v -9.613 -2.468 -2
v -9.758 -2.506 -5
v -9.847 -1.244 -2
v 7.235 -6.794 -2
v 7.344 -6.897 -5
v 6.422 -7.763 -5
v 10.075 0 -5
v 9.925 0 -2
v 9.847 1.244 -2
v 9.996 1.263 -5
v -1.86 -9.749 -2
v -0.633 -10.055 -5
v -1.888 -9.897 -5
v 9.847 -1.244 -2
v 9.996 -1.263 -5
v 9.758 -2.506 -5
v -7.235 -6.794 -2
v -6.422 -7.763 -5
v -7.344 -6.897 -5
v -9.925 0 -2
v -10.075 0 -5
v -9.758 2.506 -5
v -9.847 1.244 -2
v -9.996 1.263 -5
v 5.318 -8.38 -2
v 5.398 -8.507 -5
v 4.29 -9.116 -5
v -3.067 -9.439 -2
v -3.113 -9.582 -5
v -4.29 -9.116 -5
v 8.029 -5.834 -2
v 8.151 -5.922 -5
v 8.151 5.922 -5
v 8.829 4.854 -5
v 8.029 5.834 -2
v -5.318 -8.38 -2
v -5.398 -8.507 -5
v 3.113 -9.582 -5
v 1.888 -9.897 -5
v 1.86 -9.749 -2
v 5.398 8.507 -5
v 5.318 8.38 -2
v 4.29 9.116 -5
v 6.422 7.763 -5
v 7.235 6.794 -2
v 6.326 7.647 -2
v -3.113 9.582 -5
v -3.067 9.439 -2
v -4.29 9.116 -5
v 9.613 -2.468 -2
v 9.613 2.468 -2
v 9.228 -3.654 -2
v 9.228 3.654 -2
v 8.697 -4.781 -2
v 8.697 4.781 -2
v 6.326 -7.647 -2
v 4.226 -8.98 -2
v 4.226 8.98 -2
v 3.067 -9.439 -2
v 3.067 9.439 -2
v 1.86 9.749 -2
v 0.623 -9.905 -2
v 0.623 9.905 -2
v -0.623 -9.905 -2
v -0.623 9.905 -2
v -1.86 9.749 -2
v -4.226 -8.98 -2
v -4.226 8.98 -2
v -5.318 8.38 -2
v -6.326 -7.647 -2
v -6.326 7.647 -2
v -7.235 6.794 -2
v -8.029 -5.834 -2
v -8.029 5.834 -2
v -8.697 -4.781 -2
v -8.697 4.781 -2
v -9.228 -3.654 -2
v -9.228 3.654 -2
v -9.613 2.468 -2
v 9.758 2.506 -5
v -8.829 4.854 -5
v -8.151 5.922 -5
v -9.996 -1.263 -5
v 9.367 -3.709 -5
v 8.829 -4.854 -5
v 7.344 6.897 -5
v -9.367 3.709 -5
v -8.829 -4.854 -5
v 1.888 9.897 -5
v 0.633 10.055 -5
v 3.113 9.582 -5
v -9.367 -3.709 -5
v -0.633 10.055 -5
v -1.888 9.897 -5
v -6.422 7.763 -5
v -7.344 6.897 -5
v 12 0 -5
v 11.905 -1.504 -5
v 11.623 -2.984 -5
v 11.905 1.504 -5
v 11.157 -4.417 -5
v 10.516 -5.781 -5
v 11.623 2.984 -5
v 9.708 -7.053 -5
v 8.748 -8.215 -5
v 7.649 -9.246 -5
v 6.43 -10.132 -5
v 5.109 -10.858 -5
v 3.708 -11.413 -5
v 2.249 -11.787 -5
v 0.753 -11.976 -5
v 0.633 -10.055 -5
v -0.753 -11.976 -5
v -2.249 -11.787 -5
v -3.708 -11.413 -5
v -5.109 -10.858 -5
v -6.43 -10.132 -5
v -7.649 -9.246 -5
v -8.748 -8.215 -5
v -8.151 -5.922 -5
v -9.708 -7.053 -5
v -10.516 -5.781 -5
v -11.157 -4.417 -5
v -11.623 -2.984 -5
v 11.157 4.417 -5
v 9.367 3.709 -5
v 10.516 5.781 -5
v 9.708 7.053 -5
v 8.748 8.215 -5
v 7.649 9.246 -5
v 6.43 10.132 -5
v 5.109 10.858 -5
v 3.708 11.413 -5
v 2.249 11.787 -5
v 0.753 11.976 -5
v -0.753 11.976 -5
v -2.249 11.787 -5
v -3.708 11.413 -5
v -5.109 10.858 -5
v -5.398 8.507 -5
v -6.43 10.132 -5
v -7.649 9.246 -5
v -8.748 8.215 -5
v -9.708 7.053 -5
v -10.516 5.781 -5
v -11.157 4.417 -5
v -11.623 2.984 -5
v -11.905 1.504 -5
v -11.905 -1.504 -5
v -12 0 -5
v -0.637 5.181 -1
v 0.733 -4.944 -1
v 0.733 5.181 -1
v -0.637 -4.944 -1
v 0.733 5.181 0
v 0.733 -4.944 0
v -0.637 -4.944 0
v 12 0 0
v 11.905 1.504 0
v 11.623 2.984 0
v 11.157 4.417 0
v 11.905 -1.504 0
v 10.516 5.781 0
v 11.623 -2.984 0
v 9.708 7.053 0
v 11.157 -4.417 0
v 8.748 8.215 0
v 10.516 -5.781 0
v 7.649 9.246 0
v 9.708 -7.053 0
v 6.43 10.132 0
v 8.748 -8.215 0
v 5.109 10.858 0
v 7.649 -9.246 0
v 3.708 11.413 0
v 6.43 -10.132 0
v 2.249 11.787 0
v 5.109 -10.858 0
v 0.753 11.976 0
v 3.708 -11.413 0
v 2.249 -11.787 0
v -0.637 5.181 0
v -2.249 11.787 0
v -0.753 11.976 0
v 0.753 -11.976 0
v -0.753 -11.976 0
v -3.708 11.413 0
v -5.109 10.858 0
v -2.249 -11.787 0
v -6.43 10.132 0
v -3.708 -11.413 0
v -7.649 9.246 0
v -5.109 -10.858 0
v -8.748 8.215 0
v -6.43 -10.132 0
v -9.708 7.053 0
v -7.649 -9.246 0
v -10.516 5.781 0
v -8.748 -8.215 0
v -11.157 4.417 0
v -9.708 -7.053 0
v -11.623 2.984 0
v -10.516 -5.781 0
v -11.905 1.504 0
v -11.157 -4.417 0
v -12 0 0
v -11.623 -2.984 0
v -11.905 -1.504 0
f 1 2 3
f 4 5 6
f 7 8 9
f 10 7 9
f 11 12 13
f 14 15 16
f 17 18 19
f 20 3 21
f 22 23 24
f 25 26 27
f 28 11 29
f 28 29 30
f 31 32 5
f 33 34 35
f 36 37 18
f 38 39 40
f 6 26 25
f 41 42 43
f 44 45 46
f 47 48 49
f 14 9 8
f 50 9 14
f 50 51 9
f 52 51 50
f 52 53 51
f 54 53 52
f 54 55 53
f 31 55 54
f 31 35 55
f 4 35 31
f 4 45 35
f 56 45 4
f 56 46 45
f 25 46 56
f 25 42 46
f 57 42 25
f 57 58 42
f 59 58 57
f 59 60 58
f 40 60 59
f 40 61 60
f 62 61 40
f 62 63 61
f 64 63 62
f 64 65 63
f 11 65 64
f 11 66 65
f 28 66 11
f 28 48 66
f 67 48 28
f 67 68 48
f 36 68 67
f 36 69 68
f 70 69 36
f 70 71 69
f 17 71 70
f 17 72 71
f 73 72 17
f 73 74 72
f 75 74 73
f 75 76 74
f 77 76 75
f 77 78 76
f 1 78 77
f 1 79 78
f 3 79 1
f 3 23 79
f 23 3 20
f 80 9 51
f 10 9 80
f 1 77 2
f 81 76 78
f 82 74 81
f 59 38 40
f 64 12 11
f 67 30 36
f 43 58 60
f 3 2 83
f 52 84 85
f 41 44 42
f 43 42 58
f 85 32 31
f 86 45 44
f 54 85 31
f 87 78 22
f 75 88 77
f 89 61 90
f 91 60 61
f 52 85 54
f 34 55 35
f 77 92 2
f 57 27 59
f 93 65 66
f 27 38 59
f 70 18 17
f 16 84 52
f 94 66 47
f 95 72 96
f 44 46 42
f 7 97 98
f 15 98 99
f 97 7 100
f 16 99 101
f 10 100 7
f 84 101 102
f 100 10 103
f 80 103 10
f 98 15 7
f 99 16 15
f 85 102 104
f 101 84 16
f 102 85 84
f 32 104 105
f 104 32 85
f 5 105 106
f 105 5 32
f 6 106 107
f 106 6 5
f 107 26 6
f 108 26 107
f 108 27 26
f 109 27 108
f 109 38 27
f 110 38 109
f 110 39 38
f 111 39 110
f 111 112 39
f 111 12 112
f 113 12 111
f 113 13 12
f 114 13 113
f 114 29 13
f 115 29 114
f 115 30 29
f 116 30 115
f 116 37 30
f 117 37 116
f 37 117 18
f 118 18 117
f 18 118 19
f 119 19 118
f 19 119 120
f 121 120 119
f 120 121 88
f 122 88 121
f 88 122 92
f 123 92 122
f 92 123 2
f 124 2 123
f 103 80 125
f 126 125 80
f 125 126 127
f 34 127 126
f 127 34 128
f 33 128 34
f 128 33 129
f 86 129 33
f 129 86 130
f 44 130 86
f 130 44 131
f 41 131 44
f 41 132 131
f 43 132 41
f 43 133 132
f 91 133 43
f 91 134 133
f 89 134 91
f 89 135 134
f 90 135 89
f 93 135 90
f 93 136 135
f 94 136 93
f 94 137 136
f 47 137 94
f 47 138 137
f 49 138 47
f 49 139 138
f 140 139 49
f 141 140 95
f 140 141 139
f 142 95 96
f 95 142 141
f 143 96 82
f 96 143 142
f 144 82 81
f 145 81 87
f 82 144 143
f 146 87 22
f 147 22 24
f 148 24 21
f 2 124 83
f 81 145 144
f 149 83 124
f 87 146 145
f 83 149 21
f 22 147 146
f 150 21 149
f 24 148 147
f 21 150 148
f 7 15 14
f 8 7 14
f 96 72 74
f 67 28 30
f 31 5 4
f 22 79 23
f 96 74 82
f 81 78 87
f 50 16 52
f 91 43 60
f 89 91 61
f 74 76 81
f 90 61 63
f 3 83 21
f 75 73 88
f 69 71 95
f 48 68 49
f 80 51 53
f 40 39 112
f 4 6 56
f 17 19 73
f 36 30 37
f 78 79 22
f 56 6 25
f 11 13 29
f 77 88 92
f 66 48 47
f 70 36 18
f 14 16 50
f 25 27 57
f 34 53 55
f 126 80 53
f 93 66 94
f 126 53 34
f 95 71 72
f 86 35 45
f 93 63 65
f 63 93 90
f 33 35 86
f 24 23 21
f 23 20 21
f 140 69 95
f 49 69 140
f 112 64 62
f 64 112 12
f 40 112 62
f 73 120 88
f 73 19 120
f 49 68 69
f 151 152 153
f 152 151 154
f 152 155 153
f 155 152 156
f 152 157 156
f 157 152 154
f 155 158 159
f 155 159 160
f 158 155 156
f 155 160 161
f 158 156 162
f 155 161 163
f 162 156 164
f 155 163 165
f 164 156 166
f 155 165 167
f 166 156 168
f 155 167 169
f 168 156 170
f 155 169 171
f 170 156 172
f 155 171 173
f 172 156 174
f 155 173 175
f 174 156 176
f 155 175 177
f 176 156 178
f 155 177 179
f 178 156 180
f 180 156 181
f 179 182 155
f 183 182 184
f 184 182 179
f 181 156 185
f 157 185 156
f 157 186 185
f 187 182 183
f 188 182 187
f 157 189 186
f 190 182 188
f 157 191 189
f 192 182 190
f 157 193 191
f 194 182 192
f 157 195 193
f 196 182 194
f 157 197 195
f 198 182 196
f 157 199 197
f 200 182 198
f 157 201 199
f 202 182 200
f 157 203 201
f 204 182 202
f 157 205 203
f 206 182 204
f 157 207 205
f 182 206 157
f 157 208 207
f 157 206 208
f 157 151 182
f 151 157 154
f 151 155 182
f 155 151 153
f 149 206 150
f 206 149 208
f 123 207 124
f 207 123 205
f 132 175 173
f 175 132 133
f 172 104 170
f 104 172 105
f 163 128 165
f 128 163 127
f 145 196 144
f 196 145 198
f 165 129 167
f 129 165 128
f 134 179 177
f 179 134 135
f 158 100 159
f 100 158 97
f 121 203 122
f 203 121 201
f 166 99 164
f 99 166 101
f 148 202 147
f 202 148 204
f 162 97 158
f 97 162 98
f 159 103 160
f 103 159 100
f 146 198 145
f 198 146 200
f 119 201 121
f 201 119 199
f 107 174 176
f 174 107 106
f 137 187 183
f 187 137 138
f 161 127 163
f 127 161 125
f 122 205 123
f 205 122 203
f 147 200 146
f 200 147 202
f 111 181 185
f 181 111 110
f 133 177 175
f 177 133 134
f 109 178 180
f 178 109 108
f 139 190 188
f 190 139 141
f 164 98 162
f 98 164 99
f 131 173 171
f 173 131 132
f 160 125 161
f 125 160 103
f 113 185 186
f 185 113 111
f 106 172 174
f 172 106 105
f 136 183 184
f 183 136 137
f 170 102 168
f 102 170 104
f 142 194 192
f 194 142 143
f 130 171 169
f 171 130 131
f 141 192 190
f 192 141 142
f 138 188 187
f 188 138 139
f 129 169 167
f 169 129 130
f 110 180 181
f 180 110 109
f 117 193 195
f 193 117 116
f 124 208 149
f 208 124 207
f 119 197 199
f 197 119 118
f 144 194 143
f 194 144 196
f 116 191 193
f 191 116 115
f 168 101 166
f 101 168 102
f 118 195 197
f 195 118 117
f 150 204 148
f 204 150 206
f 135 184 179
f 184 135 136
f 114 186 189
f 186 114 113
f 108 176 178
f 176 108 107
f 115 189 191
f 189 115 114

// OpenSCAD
$fn = 50;

difference() {
	union() {
		translate(v = [0, 0, -5.0]) {
			cylinder(h = 5, r = 12.0);
		}
	}
	union() {
		#translate(v = [0, 0, -5.0]) {
			cylinder(h = 3, r1 = 10.075, r2 = 9.925);
		}
		translate(v = [0, 0, -1]) {
			linear_extrude(height = 1) {
				text(font = "Impact", halign = "center", size = 10, text = "I", valign = "center");
			}
		}
	}
}
